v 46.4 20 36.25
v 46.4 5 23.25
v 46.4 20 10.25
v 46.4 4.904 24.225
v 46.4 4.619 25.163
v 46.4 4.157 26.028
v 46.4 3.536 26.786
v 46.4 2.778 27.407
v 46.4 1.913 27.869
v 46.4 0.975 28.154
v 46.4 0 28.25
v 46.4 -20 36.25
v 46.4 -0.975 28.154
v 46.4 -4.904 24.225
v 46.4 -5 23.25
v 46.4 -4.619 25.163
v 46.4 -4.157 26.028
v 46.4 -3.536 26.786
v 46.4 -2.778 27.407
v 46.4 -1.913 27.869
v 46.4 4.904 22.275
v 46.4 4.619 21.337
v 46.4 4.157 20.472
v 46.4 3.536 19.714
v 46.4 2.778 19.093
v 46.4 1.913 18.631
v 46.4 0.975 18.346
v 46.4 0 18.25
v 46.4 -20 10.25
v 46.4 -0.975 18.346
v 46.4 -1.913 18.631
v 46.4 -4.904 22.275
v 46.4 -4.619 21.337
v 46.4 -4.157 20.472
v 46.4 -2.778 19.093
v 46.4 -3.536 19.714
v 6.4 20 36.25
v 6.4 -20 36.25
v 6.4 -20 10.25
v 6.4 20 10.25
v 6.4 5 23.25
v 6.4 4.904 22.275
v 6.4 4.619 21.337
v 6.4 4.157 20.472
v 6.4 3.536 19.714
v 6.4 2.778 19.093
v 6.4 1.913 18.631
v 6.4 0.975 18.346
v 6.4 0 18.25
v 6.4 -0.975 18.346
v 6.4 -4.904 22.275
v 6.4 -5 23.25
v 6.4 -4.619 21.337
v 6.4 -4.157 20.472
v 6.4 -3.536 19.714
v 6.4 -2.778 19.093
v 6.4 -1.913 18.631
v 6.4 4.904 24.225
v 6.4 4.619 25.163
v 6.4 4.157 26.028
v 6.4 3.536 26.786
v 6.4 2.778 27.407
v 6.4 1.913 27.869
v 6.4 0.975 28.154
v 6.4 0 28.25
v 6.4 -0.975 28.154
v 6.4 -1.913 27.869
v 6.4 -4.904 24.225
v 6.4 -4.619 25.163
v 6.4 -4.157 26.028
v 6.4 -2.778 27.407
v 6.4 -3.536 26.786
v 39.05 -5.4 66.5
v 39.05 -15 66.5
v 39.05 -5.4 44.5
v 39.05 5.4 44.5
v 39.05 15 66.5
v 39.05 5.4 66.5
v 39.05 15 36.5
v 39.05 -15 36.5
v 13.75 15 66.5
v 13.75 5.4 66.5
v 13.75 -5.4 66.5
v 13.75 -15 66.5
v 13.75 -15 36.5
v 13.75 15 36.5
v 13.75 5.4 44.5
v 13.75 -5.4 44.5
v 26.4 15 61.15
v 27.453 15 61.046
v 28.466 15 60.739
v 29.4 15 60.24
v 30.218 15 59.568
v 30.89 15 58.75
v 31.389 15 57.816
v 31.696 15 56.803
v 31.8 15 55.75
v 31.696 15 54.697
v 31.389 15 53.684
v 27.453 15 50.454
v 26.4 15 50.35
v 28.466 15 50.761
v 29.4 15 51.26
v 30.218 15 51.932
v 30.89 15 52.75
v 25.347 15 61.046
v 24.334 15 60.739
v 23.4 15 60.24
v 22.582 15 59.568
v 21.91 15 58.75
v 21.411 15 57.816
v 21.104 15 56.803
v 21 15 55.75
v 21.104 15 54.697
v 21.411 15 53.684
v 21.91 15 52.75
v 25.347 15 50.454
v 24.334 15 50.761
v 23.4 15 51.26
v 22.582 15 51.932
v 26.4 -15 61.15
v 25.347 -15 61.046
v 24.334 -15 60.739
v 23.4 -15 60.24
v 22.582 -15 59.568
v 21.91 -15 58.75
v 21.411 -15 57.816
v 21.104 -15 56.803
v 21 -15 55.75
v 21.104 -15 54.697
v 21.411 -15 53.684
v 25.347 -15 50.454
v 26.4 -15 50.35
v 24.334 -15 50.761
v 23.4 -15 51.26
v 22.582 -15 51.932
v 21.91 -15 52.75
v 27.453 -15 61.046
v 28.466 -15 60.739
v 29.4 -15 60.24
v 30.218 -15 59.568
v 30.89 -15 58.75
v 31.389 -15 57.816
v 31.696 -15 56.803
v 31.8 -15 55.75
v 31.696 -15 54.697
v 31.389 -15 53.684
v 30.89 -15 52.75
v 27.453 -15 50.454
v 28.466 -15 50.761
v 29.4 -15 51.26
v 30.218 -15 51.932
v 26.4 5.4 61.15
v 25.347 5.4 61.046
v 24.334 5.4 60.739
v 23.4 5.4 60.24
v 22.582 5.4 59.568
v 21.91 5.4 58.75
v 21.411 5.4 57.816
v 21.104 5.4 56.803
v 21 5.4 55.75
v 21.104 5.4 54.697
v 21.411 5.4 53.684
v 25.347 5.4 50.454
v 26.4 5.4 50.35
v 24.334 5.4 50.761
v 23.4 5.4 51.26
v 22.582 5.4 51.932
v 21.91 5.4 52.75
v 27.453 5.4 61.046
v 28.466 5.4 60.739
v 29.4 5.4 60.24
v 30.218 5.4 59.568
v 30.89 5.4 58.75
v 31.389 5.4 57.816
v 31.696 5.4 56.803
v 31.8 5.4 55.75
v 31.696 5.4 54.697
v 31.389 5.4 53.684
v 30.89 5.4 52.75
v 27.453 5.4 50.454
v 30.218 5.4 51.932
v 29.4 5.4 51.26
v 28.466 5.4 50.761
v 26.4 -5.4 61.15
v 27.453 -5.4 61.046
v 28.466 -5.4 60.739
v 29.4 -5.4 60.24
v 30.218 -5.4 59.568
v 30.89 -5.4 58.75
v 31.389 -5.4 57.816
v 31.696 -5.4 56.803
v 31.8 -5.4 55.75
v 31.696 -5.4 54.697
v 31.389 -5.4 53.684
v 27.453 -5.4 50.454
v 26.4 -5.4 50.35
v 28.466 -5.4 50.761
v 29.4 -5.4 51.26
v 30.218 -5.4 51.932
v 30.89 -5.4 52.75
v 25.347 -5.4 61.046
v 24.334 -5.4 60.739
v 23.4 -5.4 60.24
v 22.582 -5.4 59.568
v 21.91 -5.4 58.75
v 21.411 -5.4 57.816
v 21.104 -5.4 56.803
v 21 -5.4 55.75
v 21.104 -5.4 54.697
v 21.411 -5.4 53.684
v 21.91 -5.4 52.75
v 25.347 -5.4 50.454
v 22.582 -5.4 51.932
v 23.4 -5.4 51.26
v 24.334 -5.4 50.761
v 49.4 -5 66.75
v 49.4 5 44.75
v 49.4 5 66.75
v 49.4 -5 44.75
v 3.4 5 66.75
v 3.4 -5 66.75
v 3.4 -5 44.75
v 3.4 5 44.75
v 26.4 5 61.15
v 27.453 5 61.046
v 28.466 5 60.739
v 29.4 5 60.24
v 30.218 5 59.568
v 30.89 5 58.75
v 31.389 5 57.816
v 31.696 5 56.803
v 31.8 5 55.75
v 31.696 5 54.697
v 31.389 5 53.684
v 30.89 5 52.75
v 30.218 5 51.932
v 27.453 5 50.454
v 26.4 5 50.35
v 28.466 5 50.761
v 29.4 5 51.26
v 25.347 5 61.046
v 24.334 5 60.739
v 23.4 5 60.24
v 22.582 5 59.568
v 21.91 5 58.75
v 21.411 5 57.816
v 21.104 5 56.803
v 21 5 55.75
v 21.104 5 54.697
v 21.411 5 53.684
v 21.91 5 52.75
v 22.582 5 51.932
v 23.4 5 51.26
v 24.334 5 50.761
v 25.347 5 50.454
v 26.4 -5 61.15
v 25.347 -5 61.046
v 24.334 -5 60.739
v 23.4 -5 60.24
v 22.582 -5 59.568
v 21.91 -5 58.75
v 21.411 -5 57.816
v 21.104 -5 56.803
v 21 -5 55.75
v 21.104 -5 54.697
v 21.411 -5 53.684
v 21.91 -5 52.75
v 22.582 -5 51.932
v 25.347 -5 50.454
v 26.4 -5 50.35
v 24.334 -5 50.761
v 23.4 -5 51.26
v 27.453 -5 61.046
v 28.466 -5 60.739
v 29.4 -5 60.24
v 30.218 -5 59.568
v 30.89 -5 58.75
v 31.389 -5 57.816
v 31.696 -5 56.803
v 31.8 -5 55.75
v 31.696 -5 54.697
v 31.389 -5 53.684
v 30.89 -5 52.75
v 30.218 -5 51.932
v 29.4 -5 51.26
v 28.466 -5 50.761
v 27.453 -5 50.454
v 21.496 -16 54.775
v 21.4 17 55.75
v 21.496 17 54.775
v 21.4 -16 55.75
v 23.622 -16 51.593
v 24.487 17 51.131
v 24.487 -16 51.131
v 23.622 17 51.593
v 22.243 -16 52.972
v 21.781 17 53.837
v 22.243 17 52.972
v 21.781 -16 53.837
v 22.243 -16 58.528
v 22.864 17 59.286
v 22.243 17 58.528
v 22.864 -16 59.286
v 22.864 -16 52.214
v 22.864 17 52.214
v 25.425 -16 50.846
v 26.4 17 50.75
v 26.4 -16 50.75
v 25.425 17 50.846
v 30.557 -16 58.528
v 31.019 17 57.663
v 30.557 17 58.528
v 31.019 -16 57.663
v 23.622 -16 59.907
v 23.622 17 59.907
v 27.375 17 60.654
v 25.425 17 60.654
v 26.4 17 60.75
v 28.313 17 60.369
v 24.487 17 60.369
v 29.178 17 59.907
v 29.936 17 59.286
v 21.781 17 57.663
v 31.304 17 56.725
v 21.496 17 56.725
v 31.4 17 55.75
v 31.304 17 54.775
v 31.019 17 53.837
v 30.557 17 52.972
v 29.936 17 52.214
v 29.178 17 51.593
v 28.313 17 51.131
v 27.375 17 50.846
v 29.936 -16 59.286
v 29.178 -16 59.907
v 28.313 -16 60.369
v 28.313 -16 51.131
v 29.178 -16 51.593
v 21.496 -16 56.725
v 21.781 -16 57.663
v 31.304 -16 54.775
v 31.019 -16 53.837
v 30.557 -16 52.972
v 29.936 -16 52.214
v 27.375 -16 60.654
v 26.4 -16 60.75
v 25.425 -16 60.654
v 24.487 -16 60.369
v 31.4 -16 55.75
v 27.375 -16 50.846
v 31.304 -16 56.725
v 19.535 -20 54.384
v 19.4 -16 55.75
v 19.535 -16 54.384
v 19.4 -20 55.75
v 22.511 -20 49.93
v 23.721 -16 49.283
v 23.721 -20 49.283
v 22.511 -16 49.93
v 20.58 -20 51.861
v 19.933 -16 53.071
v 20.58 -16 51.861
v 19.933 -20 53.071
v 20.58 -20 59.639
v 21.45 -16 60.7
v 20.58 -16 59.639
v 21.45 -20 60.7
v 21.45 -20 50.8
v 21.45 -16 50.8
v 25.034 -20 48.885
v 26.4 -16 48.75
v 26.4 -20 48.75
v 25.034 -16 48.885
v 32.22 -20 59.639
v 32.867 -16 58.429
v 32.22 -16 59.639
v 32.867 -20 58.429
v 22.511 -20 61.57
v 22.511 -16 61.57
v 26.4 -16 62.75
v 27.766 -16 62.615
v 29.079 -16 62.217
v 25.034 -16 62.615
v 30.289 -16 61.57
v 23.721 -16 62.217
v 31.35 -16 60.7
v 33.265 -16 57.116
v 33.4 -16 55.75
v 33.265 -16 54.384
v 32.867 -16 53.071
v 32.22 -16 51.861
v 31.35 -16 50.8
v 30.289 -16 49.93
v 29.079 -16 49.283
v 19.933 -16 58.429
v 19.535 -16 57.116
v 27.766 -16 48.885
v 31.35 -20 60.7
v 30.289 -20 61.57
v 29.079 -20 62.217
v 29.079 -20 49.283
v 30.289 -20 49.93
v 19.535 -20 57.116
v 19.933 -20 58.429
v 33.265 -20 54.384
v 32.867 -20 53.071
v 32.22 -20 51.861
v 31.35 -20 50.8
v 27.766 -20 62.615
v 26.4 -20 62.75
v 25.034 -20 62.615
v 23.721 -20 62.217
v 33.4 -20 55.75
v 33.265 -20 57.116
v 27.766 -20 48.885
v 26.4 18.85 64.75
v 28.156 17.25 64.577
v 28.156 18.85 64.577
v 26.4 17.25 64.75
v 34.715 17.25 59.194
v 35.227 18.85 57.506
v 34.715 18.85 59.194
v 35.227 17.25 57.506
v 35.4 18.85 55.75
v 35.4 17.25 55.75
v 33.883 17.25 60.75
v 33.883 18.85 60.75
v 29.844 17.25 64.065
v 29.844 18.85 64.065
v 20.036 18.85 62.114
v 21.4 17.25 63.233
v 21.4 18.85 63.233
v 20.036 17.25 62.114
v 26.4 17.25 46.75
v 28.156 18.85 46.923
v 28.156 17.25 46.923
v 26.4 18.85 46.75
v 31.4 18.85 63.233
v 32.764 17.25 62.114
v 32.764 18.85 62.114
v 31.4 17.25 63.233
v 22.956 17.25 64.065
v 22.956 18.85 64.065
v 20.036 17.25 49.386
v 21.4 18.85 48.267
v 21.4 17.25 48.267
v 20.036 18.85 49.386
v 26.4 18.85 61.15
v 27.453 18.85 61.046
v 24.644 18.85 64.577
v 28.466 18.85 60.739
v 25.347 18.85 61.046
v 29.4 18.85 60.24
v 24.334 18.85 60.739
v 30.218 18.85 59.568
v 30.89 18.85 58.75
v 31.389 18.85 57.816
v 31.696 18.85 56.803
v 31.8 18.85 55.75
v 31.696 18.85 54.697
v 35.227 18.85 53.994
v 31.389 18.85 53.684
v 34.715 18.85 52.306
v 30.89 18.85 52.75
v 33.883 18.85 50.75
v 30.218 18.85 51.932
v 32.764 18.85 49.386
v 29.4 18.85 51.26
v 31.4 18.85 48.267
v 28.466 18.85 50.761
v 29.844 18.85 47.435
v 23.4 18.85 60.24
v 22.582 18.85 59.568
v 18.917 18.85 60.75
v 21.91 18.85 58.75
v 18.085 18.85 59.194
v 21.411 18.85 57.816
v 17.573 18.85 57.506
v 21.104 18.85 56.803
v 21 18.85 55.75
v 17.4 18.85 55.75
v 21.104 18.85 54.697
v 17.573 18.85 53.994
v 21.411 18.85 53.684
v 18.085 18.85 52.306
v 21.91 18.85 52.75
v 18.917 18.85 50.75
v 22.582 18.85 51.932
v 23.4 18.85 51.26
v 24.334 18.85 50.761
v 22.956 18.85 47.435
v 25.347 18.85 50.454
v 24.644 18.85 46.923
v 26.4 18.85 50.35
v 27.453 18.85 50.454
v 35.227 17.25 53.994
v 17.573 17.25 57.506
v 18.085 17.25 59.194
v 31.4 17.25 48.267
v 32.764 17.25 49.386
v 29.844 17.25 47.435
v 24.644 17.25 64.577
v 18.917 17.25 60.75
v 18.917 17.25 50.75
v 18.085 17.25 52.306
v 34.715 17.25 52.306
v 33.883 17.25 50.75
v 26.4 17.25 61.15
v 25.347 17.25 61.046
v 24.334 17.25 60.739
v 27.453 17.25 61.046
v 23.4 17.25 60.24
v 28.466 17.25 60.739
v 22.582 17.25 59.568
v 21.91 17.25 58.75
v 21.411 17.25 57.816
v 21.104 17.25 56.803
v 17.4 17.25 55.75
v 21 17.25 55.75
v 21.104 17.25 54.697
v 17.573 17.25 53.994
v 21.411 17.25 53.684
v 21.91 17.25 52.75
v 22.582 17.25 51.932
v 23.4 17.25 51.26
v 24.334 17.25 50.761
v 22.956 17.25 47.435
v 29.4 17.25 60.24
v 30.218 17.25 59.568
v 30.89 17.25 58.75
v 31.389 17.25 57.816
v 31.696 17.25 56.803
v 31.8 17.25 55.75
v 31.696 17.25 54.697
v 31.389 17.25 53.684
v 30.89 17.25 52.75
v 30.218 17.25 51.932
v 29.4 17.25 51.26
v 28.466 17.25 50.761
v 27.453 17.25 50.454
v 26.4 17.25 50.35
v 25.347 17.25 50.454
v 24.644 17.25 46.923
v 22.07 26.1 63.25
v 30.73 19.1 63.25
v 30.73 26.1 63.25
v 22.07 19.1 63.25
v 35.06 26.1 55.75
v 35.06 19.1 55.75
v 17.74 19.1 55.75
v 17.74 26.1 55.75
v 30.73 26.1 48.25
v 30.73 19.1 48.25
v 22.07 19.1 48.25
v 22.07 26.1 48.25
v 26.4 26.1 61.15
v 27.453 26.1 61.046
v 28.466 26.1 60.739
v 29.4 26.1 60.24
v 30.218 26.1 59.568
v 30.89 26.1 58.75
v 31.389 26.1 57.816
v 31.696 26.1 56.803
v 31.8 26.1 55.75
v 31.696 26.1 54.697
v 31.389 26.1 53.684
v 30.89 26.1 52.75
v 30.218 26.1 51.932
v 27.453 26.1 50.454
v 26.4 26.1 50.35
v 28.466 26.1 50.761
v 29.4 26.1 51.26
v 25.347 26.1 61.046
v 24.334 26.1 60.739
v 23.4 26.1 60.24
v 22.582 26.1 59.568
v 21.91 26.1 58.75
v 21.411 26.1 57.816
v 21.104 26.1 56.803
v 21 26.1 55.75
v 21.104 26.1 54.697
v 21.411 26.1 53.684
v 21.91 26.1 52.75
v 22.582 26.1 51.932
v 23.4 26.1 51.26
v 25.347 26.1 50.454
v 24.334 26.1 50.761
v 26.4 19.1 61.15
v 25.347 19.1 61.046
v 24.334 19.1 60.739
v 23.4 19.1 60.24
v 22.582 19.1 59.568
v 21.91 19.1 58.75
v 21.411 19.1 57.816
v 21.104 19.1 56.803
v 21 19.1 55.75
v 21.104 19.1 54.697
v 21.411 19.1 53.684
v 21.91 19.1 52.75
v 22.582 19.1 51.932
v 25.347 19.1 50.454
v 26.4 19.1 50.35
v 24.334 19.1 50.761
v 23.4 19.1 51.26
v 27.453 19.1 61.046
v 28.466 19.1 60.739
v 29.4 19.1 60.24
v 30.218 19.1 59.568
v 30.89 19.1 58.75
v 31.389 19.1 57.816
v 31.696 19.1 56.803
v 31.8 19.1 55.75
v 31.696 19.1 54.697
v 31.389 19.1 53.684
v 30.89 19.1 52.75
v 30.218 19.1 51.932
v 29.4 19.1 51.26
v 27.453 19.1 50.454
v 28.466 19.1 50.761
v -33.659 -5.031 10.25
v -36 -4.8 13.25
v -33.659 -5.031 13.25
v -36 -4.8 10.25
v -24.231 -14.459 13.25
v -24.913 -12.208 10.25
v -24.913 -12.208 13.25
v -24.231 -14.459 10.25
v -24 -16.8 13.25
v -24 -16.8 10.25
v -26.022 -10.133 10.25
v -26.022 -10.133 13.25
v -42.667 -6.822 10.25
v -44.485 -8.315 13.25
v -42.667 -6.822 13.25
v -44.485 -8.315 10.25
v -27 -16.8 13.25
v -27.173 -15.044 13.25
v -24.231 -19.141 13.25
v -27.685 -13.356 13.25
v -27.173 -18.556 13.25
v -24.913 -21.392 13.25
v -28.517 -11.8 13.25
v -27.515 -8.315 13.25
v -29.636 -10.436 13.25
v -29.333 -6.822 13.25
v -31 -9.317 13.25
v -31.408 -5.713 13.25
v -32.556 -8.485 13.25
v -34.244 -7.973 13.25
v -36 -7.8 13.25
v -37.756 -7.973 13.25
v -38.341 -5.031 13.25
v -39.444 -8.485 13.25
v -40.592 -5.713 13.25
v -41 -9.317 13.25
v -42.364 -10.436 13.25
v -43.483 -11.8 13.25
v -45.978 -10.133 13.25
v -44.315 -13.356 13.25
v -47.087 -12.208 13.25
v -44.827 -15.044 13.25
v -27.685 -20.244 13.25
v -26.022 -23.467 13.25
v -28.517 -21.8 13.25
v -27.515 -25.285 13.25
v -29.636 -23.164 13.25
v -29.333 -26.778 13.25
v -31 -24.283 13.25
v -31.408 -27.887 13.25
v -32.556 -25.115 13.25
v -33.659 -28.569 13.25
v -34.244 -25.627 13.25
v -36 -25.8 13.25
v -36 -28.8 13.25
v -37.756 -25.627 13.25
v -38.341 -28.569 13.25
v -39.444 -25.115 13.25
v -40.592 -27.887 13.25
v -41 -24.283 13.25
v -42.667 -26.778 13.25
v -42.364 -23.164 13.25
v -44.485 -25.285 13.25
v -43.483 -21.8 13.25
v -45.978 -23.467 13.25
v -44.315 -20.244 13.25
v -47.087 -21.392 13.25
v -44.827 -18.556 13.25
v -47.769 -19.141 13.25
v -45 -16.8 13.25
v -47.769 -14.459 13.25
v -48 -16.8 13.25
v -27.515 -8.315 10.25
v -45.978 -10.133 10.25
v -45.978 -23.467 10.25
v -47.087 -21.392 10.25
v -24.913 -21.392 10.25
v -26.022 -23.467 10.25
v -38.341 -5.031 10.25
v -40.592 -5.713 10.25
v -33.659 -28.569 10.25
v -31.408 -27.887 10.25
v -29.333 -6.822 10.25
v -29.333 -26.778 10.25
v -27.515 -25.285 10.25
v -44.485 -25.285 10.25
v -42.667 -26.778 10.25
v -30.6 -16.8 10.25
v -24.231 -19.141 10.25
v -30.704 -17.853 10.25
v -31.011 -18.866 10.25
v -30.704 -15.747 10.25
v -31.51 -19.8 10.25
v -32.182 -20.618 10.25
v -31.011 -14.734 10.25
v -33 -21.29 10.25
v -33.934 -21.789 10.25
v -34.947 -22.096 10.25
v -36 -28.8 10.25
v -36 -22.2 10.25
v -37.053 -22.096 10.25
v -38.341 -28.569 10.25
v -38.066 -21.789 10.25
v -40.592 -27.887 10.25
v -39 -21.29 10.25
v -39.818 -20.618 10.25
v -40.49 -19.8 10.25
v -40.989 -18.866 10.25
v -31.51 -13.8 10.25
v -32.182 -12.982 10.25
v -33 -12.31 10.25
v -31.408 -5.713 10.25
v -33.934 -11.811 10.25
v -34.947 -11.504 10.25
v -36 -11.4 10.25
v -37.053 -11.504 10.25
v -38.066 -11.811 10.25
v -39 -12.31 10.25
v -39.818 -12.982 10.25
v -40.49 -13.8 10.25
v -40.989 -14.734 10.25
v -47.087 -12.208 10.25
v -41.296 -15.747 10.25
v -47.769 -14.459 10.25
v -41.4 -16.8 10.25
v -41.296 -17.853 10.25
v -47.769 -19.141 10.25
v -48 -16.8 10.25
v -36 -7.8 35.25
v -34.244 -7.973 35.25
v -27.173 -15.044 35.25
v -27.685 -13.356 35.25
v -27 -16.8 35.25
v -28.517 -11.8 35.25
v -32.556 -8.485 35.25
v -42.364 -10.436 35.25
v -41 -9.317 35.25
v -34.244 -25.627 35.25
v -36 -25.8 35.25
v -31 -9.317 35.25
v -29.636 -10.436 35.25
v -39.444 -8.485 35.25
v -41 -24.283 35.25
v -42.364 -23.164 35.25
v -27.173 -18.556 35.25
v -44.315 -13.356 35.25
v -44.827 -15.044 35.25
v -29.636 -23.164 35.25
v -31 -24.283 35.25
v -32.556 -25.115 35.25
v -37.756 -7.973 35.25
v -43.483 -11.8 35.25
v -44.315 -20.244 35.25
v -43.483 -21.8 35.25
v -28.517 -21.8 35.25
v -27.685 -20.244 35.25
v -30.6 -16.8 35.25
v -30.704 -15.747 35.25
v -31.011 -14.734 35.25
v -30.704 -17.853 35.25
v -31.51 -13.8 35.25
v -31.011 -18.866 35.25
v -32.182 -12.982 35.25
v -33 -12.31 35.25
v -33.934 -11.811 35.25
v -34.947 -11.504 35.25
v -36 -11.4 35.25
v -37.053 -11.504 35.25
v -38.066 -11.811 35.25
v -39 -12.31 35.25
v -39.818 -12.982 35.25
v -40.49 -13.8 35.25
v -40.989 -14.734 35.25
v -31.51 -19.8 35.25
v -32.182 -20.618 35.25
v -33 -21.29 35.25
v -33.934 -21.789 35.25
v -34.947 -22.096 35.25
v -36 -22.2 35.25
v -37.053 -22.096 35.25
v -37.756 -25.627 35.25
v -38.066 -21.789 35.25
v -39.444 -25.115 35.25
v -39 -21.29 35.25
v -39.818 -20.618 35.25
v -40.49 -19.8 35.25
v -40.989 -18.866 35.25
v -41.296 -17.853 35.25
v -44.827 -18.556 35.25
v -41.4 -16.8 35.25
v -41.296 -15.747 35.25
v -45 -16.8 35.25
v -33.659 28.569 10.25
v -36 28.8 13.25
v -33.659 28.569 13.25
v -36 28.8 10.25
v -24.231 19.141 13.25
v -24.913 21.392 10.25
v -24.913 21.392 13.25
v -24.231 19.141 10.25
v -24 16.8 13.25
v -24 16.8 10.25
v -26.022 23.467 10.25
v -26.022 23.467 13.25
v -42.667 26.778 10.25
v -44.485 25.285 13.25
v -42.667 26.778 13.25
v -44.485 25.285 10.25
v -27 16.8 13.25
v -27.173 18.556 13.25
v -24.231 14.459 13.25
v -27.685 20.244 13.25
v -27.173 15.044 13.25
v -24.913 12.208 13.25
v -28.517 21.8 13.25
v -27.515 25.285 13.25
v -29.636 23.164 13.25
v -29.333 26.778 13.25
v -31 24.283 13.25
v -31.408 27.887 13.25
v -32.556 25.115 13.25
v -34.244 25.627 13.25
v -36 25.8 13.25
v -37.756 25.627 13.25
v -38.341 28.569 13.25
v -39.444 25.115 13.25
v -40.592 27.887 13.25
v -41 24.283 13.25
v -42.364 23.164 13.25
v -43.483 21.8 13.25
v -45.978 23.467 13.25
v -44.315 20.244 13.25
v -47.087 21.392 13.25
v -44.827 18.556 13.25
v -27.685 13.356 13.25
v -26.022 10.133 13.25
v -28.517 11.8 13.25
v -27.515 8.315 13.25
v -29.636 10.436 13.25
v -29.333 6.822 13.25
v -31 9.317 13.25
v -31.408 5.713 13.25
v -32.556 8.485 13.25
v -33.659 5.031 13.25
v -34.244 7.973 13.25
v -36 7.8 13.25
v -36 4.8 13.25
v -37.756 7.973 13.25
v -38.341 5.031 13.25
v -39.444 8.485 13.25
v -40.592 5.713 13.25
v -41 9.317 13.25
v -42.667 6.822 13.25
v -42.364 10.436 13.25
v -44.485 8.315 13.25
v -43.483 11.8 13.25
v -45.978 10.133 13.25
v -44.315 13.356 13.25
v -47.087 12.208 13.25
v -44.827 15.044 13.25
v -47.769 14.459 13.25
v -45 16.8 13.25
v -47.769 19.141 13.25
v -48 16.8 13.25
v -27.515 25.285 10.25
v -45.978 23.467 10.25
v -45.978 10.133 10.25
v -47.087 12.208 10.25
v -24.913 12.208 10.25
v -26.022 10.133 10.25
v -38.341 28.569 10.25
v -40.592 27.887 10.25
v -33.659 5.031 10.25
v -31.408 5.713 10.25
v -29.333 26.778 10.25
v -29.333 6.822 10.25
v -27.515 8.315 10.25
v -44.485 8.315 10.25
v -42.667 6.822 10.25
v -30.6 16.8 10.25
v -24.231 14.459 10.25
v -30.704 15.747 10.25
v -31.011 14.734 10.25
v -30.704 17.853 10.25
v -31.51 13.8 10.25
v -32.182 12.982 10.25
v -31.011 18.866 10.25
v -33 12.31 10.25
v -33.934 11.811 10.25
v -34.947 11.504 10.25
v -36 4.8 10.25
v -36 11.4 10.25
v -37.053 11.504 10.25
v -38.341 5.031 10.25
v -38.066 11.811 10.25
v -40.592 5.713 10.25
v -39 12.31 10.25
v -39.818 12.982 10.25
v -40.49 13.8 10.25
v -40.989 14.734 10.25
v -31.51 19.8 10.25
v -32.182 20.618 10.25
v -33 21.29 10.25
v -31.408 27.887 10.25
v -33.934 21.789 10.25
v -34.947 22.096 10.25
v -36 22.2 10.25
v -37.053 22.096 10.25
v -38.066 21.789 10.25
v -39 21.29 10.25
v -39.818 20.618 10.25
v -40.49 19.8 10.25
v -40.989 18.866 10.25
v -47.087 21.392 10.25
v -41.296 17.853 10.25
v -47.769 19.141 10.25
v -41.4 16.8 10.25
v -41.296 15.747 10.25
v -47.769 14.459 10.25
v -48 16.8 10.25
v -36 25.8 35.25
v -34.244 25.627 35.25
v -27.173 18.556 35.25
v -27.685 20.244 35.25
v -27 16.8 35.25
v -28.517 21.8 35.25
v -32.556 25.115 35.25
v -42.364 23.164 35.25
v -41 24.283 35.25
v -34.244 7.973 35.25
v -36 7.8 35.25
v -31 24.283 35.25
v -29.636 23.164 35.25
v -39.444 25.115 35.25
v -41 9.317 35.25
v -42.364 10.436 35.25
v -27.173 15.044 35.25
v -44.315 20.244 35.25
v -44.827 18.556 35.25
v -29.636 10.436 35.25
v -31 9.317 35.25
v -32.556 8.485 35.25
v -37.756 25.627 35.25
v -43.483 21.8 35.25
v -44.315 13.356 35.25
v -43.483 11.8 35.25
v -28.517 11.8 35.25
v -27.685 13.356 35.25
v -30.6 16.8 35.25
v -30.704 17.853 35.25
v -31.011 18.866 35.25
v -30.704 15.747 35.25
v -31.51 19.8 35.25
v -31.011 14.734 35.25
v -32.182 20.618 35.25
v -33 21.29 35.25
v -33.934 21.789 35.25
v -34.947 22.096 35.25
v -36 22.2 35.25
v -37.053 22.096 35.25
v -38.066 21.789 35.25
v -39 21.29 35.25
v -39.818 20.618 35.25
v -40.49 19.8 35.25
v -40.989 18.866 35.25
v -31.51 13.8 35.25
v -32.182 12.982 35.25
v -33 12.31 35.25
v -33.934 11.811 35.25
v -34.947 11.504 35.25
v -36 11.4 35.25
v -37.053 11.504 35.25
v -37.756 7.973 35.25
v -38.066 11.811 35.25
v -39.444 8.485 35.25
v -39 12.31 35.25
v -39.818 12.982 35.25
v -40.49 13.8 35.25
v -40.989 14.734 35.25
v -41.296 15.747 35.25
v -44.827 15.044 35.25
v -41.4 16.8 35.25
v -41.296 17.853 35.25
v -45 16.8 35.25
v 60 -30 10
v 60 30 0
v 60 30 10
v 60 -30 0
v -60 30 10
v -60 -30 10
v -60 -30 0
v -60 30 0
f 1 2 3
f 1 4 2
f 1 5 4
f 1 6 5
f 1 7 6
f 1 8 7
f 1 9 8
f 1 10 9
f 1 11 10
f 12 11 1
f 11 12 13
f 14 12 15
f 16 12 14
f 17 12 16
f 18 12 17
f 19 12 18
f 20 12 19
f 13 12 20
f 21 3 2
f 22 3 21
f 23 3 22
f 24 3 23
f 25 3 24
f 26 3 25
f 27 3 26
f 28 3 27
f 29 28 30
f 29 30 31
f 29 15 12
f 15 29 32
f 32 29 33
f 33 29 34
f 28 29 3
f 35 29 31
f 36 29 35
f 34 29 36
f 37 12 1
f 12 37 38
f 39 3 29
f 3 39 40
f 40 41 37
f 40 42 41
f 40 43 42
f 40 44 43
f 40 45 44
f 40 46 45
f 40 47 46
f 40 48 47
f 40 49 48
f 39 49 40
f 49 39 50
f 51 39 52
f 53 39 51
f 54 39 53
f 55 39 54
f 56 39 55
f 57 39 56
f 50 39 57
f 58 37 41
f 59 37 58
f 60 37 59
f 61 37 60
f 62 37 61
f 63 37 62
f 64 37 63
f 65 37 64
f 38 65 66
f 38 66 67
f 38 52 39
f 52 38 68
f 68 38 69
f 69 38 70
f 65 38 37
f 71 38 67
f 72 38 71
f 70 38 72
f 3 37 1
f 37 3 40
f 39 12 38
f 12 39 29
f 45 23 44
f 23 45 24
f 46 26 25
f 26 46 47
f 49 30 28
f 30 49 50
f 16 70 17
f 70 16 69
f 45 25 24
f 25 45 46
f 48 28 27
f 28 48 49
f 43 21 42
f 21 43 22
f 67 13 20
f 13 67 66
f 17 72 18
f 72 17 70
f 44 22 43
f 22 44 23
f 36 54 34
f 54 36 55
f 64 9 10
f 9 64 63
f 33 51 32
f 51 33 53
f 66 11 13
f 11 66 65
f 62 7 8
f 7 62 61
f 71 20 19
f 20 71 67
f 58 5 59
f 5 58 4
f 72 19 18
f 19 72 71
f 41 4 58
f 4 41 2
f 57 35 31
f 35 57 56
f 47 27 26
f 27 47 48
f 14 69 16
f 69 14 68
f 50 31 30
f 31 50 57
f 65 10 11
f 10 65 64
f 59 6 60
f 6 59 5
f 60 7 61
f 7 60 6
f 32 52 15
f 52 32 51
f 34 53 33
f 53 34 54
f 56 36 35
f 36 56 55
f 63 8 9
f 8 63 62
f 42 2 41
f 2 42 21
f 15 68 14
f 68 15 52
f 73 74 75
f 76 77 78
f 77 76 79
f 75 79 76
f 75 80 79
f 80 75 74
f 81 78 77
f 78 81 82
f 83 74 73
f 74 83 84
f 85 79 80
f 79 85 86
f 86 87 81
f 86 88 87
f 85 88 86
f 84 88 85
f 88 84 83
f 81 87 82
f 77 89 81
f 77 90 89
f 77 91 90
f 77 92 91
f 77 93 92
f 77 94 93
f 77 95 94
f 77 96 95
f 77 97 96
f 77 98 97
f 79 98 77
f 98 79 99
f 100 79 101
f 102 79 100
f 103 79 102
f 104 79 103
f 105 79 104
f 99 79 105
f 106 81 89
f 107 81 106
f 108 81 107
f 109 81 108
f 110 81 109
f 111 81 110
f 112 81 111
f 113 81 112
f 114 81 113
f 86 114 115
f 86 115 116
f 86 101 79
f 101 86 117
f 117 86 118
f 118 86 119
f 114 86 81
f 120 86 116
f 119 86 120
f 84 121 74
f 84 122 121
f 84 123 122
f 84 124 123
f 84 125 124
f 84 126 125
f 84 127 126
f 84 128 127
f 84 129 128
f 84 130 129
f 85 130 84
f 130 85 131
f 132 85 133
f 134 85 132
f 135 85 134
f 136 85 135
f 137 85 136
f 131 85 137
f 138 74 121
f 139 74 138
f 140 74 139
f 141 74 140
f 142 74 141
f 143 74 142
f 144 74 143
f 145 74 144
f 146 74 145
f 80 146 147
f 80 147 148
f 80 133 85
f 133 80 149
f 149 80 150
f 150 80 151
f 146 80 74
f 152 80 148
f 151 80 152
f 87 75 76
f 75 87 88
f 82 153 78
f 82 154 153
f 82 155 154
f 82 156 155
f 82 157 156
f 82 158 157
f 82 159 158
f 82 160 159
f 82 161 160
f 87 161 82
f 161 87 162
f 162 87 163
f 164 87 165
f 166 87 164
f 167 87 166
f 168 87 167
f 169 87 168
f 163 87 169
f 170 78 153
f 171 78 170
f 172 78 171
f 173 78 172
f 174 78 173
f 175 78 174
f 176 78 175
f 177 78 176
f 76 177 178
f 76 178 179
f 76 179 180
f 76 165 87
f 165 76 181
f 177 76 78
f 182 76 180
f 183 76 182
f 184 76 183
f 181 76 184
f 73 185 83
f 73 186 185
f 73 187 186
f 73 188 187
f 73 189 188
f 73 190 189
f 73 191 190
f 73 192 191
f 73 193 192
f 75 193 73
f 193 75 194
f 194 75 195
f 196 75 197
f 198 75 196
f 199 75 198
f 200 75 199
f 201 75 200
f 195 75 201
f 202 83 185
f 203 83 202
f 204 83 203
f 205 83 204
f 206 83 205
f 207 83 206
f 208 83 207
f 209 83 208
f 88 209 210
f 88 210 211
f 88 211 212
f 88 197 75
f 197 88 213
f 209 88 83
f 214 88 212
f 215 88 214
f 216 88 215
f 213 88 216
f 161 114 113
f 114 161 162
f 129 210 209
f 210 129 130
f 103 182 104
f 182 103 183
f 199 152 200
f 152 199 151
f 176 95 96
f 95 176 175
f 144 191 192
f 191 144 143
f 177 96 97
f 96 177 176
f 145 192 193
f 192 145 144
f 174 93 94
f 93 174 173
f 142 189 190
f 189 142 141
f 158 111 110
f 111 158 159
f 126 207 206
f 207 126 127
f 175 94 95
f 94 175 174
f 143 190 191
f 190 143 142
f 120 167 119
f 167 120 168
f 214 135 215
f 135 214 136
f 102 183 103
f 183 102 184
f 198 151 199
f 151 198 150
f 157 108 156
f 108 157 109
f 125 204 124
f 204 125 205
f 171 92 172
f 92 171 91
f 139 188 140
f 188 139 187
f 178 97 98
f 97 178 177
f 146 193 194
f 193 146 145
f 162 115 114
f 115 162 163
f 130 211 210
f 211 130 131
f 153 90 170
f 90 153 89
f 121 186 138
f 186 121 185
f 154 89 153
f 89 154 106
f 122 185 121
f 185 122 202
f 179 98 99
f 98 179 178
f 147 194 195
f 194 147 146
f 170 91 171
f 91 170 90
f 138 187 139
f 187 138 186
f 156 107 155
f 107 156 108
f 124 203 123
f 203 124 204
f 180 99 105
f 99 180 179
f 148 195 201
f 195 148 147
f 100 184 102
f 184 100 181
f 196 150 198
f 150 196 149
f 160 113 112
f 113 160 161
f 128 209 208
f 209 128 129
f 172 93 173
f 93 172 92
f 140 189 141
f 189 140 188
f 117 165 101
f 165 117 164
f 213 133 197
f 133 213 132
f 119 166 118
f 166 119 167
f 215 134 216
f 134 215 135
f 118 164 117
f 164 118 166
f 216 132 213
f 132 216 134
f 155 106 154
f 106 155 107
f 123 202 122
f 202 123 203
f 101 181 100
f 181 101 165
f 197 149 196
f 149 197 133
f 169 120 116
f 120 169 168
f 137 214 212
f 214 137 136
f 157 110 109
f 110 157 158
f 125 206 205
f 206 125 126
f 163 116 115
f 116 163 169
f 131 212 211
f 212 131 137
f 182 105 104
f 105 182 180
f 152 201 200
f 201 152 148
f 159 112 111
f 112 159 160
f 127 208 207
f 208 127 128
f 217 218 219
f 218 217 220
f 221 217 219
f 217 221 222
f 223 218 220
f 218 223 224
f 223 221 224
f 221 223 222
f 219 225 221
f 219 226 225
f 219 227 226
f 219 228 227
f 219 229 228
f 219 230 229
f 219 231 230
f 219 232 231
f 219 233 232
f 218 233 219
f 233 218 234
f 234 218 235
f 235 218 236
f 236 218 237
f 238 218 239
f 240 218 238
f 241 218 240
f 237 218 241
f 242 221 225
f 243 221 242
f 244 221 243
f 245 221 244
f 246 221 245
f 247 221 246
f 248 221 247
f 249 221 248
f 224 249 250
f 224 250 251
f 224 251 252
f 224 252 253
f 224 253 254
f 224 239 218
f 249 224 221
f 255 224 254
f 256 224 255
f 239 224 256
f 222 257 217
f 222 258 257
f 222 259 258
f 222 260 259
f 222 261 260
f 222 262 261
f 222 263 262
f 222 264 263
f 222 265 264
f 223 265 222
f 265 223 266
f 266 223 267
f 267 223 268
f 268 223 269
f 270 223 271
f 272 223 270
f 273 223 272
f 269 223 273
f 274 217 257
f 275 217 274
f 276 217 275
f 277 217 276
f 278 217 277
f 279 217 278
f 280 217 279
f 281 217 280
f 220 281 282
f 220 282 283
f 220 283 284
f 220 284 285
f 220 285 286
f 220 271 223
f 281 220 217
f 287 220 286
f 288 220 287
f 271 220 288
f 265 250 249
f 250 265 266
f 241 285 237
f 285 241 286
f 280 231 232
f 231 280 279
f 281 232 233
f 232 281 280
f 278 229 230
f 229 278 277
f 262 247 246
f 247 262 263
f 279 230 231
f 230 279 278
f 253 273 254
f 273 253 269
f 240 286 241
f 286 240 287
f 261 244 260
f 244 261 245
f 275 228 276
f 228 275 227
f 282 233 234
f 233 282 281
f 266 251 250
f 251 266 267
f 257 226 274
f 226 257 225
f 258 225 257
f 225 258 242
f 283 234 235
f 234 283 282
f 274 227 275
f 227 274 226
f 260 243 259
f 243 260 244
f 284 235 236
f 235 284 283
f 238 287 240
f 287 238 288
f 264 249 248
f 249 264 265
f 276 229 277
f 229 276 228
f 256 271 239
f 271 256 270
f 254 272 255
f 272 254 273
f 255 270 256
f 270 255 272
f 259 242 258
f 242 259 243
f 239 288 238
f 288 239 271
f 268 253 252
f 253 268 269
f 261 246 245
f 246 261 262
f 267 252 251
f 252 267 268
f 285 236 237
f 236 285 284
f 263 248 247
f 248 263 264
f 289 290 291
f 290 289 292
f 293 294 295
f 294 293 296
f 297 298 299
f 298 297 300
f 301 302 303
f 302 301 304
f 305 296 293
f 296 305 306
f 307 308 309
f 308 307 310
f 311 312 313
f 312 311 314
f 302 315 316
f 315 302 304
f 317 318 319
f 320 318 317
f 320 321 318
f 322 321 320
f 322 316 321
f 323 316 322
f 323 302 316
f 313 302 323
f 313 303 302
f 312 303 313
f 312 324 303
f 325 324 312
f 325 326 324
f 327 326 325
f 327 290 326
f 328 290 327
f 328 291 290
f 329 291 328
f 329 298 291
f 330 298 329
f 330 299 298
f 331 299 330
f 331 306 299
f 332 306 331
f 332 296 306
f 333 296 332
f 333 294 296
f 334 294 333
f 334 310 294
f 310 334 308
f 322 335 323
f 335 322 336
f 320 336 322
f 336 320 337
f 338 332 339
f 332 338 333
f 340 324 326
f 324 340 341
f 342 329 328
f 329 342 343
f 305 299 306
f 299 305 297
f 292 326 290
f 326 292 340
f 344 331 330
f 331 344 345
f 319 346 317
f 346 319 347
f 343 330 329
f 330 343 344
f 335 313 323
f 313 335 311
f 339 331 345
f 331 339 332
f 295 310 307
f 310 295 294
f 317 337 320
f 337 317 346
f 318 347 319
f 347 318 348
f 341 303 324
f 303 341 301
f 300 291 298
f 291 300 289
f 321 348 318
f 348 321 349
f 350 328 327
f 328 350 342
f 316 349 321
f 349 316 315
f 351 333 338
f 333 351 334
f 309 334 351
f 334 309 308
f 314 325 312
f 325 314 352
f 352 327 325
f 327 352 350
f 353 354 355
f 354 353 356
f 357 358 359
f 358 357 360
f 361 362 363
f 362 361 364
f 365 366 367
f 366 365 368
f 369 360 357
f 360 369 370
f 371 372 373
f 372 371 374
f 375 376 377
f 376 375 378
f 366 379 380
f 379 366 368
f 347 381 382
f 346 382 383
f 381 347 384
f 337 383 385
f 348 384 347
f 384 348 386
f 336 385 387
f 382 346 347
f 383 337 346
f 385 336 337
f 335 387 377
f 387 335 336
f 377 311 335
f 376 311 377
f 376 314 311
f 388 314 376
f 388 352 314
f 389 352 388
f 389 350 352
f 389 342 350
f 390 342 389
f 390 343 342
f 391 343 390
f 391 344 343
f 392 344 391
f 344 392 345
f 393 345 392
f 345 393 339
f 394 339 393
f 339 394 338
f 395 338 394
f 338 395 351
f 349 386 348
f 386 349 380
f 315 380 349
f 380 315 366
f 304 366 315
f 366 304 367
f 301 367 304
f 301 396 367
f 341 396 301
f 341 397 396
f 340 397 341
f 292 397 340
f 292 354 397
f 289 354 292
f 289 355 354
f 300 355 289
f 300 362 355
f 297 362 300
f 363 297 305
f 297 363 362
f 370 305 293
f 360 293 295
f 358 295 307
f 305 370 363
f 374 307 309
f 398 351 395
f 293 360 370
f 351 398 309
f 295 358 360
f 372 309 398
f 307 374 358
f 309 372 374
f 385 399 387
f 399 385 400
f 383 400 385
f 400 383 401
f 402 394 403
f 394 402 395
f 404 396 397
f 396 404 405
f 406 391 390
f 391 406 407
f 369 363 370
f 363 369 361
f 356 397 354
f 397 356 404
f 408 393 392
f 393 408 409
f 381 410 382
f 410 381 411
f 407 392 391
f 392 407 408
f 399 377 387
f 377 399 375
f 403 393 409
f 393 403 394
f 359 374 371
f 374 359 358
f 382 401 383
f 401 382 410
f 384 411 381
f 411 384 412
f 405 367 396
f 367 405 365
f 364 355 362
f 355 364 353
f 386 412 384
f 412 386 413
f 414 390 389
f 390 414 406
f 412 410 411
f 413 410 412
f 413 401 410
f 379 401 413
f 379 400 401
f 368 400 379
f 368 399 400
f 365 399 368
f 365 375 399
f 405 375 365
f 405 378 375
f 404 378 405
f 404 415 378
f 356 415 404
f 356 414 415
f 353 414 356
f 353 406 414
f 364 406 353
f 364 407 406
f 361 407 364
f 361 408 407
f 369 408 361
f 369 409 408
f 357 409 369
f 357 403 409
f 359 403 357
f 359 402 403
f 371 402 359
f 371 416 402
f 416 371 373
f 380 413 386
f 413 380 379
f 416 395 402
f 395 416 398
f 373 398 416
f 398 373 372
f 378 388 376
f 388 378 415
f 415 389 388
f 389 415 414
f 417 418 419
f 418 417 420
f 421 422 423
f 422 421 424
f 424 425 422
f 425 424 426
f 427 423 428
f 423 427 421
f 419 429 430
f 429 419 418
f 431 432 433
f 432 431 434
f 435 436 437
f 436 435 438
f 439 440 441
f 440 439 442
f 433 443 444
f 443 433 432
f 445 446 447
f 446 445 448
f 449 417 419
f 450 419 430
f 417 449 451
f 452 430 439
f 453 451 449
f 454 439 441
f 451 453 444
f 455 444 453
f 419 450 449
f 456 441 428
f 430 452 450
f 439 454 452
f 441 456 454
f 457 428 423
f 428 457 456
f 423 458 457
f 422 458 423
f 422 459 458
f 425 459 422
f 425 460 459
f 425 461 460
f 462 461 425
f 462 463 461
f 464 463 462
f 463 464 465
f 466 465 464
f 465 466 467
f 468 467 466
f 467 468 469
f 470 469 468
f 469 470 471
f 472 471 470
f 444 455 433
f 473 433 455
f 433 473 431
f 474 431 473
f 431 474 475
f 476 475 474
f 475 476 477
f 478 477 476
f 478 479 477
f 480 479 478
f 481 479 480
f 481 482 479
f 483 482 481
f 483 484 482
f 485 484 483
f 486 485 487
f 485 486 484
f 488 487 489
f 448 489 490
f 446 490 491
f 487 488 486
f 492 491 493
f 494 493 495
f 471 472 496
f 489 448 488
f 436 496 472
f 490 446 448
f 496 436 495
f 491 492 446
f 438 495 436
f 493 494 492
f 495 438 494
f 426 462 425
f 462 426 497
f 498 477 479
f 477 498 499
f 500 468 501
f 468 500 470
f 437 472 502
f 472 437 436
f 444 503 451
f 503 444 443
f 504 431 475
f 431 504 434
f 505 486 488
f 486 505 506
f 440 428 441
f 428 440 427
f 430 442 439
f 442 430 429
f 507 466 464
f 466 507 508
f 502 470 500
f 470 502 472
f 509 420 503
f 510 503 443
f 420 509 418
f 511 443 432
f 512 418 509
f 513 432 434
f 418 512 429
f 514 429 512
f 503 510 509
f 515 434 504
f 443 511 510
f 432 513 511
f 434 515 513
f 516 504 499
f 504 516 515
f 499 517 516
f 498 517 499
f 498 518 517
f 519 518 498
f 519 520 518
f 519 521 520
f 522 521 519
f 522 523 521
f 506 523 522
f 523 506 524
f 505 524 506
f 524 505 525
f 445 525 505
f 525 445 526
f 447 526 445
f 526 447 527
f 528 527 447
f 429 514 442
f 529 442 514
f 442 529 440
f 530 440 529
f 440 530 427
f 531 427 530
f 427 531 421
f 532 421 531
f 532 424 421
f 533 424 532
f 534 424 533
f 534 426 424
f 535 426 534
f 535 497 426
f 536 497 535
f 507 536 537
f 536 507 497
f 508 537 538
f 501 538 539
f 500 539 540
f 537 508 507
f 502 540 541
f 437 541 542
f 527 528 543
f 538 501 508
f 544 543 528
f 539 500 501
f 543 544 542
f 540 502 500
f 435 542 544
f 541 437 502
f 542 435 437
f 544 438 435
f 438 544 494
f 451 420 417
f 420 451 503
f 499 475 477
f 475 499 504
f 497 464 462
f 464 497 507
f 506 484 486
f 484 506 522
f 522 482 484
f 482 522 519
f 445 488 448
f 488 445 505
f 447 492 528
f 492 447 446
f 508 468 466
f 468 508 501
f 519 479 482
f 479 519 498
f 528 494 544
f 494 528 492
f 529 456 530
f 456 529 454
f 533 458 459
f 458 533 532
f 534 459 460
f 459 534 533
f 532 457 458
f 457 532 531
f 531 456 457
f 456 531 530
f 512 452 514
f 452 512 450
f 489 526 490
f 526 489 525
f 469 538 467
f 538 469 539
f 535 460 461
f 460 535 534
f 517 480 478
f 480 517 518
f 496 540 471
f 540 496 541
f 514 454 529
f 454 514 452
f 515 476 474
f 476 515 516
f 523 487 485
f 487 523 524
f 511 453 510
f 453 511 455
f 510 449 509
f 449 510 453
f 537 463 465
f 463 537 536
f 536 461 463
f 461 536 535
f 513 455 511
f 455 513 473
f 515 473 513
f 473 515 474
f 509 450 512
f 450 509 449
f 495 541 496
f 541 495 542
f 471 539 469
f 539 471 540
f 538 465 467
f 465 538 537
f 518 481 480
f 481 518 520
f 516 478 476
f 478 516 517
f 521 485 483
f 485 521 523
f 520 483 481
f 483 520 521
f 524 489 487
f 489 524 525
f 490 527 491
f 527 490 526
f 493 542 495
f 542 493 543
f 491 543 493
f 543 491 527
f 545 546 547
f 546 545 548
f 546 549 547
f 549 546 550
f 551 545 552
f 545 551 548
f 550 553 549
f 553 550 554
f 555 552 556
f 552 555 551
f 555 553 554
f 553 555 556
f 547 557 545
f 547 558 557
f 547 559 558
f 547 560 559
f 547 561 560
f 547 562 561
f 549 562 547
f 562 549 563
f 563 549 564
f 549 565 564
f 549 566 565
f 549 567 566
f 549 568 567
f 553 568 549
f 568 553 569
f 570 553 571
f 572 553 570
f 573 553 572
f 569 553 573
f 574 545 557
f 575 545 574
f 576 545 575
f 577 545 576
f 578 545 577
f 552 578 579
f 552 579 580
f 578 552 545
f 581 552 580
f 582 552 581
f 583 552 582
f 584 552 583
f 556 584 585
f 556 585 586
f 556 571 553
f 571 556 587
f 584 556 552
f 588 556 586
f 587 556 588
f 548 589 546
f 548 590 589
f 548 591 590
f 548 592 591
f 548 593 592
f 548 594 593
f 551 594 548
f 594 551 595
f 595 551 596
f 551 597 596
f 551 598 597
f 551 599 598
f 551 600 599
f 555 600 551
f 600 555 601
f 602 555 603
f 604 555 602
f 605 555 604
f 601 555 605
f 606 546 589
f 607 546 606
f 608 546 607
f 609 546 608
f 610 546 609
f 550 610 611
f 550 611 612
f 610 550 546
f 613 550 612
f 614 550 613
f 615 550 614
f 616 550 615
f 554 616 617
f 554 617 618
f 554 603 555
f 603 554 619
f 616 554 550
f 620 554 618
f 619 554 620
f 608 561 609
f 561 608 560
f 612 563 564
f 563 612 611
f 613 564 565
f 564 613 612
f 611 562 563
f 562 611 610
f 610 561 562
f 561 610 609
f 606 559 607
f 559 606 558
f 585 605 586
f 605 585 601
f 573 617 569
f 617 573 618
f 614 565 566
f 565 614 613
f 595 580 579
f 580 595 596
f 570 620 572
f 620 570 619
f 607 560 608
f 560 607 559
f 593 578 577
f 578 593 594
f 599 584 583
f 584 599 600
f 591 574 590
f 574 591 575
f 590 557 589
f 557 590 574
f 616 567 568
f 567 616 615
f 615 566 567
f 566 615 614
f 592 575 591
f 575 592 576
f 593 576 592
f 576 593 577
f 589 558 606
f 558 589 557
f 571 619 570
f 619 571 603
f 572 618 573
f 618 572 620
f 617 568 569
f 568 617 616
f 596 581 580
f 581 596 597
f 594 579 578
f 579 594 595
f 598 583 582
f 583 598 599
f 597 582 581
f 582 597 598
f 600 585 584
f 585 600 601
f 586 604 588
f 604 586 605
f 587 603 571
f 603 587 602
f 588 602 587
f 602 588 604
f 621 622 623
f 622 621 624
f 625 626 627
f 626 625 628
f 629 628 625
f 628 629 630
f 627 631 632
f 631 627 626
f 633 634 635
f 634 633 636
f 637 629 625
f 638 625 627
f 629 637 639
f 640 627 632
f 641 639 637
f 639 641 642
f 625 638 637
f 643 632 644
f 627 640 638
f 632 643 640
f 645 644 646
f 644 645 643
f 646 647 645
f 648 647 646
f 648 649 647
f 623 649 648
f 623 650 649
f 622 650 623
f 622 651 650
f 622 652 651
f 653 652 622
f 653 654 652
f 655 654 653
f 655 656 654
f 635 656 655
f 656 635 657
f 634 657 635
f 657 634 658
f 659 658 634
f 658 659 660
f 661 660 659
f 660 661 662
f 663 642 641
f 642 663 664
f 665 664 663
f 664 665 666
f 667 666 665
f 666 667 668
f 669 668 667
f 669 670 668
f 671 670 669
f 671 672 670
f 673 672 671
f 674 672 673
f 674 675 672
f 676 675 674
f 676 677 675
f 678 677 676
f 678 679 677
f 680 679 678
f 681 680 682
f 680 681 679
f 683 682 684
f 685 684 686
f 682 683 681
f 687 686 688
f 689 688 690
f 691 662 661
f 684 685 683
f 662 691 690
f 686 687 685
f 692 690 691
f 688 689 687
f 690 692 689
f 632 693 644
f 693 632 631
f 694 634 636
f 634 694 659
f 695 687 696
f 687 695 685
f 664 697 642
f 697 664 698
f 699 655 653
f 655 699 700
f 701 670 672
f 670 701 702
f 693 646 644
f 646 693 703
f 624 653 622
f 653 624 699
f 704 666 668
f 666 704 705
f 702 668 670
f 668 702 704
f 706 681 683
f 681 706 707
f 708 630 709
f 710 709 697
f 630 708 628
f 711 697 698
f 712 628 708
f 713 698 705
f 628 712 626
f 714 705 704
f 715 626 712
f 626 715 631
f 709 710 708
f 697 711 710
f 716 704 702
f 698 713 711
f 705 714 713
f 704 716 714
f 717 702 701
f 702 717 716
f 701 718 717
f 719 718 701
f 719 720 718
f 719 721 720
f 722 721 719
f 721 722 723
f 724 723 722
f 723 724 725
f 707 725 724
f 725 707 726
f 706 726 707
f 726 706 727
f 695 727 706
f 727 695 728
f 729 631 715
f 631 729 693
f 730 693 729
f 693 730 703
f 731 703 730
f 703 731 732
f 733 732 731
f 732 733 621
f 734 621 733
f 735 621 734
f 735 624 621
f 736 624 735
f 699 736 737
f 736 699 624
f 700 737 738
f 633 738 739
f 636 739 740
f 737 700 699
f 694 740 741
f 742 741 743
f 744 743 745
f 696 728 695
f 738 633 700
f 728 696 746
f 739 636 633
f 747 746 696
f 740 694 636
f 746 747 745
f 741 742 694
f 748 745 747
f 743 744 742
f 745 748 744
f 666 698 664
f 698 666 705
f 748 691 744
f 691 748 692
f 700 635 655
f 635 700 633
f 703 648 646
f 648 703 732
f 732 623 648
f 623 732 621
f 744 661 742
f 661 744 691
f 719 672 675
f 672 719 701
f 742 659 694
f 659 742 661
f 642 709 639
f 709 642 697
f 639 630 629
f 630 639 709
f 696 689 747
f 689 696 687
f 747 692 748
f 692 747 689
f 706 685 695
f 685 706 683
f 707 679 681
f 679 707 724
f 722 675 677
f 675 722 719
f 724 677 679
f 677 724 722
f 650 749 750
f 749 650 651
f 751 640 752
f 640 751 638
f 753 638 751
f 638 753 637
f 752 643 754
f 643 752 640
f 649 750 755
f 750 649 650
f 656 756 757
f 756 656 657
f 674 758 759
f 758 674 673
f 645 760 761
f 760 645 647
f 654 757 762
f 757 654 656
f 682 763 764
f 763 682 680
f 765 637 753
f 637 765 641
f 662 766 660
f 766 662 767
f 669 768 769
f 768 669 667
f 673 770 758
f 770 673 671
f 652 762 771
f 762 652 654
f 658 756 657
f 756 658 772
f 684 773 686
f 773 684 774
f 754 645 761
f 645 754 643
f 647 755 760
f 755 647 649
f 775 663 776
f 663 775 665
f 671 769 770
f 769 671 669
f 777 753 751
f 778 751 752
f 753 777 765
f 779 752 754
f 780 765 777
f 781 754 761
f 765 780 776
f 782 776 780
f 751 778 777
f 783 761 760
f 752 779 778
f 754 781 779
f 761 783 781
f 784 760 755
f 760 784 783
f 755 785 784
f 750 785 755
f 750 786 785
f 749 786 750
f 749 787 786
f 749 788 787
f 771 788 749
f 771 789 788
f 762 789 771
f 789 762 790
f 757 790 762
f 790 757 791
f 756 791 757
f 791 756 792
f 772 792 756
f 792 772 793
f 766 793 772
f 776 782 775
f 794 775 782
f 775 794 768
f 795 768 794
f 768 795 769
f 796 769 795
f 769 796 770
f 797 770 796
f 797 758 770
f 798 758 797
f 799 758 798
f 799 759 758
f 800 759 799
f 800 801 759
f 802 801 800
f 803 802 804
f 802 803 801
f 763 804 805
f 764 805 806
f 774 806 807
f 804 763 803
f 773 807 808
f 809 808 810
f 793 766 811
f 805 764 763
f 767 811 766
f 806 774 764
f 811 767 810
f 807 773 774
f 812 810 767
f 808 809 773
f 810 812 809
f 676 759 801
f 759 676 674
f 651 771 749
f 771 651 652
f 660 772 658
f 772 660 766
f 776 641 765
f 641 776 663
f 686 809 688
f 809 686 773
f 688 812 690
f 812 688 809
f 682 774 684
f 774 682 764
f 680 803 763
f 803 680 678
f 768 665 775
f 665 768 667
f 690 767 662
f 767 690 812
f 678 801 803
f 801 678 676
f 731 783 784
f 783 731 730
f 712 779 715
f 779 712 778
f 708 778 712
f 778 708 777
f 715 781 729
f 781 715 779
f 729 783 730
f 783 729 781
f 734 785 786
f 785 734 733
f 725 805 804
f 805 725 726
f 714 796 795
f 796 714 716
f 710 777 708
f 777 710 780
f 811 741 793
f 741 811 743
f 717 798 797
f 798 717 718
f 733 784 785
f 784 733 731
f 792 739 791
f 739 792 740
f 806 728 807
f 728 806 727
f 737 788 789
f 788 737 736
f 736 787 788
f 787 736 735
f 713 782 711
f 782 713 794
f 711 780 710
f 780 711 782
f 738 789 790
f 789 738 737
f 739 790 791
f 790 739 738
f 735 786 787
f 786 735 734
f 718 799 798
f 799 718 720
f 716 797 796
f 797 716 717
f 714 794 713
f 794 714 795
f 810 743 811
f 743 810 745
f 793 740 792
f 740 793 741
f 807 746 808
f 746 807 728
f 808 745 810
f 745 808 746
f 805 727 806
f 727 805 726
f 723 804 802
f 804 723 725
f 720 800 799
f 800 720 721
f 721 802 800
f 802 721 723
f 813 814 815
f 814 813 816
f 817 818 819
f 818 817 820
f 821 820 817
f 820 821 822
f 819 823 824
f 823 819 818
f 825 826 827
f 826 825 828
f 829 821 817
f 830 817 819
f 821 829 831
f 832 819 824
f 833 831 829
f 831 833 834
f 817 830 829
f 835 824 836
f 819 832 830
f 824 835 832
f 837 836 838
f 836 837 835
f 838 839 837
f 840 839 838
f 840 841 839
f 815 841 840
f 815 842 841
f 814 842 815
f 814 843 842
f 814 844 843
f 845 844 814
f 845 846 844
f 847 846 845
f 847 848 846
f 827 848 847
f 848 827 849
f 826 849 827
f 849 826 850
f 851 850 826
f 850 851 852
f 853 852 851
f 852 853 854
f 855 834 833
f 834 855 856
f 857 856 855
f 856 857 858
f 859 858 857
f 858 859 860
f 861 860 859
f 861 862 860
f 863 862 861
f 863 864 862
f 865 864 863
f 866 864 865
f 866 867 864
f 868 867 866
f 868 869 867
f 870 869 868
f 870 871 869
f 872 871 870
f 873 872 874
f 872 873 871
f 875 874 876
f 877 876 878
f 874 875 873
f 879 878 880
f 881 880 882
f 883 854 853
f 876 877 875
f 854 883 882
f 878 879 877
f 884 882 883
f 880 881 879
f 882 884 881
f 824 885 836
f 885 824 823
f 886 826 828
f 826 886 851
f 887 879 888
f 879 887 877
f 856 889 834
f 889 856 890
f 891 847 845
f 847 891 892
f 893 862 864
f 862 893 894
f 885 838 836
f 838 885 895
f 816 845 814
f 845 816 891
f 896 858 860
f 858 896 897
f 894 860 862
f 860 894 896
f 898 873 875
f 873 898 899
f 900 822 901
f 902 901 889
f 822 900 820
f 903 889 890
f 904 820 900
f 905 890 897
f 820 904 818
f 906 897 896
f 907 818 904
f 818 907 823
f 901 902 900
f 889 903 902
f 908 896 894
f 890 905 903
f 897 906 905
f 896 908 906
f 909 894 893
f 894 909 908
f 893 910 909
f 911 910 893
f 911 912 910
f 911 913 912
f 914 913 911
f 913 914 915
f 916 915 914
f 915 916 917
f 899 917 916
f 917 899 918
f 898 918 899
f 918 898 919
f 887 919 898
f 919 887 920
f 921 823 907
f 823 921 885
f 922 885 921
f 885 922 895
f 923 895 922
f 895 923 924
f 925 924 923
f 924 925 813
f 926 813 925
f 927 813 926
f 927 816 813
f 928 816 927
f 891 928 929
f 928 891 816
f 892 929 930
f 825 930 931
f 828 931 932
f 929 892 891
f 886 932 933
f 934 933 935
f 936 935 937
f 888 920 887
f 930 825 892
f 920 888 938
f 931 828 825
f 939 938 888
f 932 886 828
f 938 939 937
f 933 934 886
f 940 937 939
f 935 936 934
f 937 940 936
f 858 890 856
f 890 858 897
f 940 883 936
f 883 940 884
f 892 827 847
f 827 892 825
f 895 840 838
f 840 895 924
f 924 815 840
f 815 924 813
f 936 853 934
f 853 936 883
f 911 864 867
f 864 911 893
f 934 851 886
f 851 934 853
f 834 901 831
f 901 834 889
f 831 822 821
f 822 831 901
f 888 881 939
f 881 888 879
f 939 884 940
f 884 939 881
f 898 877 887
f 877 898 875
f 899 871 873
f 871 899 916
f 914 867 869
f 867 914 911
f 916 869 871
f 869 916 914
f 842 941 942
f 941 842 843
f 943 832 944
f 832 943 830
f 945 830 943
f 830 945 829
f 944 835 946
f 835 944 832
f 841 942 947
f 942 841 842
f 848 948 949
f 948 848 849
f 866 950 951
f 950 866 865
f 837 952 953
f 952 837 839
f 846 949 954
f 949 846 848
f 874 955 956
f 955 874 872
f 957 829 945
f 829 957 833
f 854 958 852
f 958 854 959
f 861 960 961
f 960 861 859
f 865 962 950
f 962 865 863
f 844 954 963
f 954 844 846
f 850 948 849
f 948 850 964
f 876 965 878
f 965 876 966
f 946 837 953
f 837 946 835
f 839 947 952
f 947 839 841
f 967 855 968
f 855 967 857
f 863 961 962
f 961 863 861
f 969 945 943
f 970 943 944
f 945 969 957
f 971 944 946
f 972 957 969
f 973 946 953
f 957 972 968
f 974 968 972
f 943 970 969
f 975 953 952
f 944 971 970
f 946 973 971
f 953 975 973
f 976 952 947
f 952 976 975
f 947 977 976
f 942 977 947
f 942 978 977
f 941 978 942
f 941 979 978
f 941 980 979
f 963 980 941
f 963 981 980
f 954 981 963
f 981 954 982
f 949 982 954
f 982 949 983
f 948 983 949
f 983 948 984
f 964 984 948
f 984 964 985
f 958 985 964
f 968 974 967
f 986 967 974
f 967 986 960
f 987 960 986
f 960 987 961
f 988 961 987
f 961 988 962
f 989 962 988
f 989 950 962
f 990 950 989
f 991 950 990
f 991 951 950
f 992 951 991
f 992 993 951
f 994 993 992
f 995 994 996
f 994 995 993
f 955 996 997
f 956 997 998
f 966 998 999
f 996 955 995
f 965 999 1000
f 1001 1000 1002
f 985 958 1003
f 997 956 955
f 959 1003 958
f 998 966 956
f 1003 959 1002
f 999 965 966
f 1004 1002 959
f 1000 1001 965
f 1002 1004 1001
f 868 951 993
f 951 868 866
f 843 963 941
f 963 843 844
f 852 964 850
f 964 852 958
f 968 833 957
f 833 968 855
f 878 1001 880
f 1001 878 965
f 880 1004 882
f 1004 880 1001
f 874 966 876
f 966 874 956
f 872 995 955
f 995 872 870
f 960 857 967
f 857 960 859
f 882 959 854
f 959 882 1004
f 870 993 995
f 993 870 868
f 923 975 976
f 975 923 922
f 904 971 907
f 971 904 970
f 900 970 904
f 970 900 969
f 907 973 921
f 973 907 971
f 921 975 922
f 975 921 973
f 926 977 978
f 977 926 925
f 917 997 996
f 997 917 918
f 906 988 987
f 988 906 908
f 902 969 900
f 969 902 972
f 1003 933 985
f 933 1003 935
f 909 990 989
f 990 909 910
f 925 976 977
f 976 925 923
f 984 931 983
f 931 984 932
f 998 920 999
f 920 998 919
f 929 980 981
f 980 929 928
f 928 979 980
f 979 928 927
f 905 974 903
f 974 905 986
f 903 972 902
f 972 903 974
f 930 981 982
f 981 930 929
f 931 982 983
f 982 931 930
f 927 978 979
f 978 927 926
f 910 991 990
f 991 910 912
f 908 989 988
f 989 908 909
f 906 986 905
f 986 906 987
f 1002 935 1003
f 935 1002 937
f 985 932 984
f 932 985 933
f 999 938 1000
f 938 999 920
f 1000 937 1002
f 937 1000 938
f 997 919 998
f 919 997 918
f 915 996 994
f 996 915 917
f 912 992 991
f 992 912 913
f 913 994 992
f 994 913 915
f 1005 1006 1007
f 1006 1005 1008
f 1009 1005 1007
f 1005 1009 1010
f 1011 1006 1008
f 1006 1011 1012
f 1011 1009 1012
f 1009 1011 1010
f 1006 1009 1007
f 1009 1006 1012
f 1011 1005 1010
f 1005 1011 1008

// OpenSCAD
$fn = 32;

// ------------------------------------------------------------------------
// Indexing jig: plate 120 x 60 mm, pin d10
// Every part is its own module, assembly() places every instance.
// ------------------------------------------------------------------------

// --- part 1 ---
module jig_plate() {
  difference() {
    translate([-60, -30, 0]) cube([120, 60, 10]);
  }
}

// --- part 2 ---
module locator_block() {
  difference() {
    translate([-20, -20, 0]) cube([40, 40, 26]);
    translate([0, 0, 13]) rotate([0, 90, 0]) cylinder(h = 42, d = 10, center = true);
  }
}

// --- part 3 ---
module index_fork() {
  difference() {
    translate([-12.65, -15, 0]) cube([25.3, 30, 30]);
    translate([-13.65, -5.4, 8]) cube([27.3, 10.8, 23]);
    translate([0, 0, 19.25]) rotate([90, 0, 0]) cylinder(h = 32, d = 10.8, center = true);
  }
}

// --- part 4 ---
module index_arm() {
  difference() {
    translate([-23, -5, 0]) cube([46, 10, 22]);
    translate([0, 0, 11]) rotate([90, 0, 0]) cylinder(h = 12, d = 10.8, center = true);
  }
}

// --- part 5 ---
module index_pin() {
  rotate([0, 90, 0]) cylinder(h = 34, d = 10, center = true);
  translate([-20, 0, 0]) rotate([0, 90, 0]) cylinder(h = 4, d = 14);
}

// --- part 6 ---
module pin_washer() {
  difference() {
      translate([0, 0, 0]) cylinder(h = 1.6, d = 18);
      translate([0, 0, -1]) cylinder(h = 3.6, d = 10.8);
    }
}

// --- part 7 ---
module lock_nut() {
  difference() {
    linear_extrude(height = 7) polygon(points = [[8.66, 0], [4.33, 7.5], [-4.33, 7.5], [-8.66, 0], [-4.33, -7.5], [4.33, -7.5]]);
    translate([0, 0, -1]) cylinder(h = 9, d = 10.8);
  }
}

// --- part 8 ---
module guide_bush_a() {
  difference() {
    union() {
      cylinder(h = 3, d = 24);
      translate([0, 0, 3]) cylinder(h = 22, d = 18);
    }
    translate([0, 0, -1]) cylinder(h = 27, d = 10.8);
  }
}

// --- part 9 ---
module guide_bush_b() {
  difference() {
    union() {
      cylinder(h = 3, d = 24);
      translate([0, 0, 3]) cylinder(h = 22, d = 18);
    }
    translate([0, 0, -1]) cylinder(h = 27, d = 10.8);
  }
}

// --- assembly ---
module assembly() {
  color([0.80, 0.24, 0.20]) translate([0, 0, 0]) rotate([0, 0, 0]) jig_plate();
  color([0.20, 0.45, 0.75]) translate([26.4, 0, 10.25]) rotate([0, 0, 0]) locator_block();
  color([0.25, 0.62, 0.32]) translate([26.4, 0, 36.5]) rotate([0, 0, 0]) index_fork();
  color([0.92, 0.70, 0.18]) translate([26.4, 0, 44.75]) rotate([0, 0, 0]) index_arm();
  color([0.58, 0.35, 0.70]) translate([26.4, 0, 55.75]) rotate([0, 0, 90]) index_pin();
  color([0.16, 0.66, 0.66]) translate([26.4, 18.85, 55.75]) rotate([90, 0, 0]) pin_washer();
  color([0.85, 0.48, 0.18]) translate([26.4, 26.1, 55.75]) rotate([90, 0, 0]) lock_nut();
  color([0.55, 0.60, 0.65]) translate([-36, -16.8, 10.25]) rotate([0, 0, 0]) guide_bush_a();
  color([0.75, 0.30, 0.55]) translate([-36, 16.8, 10.25]) rotate([0, 0, 0]) guide_bush_b();
}

assembly();
